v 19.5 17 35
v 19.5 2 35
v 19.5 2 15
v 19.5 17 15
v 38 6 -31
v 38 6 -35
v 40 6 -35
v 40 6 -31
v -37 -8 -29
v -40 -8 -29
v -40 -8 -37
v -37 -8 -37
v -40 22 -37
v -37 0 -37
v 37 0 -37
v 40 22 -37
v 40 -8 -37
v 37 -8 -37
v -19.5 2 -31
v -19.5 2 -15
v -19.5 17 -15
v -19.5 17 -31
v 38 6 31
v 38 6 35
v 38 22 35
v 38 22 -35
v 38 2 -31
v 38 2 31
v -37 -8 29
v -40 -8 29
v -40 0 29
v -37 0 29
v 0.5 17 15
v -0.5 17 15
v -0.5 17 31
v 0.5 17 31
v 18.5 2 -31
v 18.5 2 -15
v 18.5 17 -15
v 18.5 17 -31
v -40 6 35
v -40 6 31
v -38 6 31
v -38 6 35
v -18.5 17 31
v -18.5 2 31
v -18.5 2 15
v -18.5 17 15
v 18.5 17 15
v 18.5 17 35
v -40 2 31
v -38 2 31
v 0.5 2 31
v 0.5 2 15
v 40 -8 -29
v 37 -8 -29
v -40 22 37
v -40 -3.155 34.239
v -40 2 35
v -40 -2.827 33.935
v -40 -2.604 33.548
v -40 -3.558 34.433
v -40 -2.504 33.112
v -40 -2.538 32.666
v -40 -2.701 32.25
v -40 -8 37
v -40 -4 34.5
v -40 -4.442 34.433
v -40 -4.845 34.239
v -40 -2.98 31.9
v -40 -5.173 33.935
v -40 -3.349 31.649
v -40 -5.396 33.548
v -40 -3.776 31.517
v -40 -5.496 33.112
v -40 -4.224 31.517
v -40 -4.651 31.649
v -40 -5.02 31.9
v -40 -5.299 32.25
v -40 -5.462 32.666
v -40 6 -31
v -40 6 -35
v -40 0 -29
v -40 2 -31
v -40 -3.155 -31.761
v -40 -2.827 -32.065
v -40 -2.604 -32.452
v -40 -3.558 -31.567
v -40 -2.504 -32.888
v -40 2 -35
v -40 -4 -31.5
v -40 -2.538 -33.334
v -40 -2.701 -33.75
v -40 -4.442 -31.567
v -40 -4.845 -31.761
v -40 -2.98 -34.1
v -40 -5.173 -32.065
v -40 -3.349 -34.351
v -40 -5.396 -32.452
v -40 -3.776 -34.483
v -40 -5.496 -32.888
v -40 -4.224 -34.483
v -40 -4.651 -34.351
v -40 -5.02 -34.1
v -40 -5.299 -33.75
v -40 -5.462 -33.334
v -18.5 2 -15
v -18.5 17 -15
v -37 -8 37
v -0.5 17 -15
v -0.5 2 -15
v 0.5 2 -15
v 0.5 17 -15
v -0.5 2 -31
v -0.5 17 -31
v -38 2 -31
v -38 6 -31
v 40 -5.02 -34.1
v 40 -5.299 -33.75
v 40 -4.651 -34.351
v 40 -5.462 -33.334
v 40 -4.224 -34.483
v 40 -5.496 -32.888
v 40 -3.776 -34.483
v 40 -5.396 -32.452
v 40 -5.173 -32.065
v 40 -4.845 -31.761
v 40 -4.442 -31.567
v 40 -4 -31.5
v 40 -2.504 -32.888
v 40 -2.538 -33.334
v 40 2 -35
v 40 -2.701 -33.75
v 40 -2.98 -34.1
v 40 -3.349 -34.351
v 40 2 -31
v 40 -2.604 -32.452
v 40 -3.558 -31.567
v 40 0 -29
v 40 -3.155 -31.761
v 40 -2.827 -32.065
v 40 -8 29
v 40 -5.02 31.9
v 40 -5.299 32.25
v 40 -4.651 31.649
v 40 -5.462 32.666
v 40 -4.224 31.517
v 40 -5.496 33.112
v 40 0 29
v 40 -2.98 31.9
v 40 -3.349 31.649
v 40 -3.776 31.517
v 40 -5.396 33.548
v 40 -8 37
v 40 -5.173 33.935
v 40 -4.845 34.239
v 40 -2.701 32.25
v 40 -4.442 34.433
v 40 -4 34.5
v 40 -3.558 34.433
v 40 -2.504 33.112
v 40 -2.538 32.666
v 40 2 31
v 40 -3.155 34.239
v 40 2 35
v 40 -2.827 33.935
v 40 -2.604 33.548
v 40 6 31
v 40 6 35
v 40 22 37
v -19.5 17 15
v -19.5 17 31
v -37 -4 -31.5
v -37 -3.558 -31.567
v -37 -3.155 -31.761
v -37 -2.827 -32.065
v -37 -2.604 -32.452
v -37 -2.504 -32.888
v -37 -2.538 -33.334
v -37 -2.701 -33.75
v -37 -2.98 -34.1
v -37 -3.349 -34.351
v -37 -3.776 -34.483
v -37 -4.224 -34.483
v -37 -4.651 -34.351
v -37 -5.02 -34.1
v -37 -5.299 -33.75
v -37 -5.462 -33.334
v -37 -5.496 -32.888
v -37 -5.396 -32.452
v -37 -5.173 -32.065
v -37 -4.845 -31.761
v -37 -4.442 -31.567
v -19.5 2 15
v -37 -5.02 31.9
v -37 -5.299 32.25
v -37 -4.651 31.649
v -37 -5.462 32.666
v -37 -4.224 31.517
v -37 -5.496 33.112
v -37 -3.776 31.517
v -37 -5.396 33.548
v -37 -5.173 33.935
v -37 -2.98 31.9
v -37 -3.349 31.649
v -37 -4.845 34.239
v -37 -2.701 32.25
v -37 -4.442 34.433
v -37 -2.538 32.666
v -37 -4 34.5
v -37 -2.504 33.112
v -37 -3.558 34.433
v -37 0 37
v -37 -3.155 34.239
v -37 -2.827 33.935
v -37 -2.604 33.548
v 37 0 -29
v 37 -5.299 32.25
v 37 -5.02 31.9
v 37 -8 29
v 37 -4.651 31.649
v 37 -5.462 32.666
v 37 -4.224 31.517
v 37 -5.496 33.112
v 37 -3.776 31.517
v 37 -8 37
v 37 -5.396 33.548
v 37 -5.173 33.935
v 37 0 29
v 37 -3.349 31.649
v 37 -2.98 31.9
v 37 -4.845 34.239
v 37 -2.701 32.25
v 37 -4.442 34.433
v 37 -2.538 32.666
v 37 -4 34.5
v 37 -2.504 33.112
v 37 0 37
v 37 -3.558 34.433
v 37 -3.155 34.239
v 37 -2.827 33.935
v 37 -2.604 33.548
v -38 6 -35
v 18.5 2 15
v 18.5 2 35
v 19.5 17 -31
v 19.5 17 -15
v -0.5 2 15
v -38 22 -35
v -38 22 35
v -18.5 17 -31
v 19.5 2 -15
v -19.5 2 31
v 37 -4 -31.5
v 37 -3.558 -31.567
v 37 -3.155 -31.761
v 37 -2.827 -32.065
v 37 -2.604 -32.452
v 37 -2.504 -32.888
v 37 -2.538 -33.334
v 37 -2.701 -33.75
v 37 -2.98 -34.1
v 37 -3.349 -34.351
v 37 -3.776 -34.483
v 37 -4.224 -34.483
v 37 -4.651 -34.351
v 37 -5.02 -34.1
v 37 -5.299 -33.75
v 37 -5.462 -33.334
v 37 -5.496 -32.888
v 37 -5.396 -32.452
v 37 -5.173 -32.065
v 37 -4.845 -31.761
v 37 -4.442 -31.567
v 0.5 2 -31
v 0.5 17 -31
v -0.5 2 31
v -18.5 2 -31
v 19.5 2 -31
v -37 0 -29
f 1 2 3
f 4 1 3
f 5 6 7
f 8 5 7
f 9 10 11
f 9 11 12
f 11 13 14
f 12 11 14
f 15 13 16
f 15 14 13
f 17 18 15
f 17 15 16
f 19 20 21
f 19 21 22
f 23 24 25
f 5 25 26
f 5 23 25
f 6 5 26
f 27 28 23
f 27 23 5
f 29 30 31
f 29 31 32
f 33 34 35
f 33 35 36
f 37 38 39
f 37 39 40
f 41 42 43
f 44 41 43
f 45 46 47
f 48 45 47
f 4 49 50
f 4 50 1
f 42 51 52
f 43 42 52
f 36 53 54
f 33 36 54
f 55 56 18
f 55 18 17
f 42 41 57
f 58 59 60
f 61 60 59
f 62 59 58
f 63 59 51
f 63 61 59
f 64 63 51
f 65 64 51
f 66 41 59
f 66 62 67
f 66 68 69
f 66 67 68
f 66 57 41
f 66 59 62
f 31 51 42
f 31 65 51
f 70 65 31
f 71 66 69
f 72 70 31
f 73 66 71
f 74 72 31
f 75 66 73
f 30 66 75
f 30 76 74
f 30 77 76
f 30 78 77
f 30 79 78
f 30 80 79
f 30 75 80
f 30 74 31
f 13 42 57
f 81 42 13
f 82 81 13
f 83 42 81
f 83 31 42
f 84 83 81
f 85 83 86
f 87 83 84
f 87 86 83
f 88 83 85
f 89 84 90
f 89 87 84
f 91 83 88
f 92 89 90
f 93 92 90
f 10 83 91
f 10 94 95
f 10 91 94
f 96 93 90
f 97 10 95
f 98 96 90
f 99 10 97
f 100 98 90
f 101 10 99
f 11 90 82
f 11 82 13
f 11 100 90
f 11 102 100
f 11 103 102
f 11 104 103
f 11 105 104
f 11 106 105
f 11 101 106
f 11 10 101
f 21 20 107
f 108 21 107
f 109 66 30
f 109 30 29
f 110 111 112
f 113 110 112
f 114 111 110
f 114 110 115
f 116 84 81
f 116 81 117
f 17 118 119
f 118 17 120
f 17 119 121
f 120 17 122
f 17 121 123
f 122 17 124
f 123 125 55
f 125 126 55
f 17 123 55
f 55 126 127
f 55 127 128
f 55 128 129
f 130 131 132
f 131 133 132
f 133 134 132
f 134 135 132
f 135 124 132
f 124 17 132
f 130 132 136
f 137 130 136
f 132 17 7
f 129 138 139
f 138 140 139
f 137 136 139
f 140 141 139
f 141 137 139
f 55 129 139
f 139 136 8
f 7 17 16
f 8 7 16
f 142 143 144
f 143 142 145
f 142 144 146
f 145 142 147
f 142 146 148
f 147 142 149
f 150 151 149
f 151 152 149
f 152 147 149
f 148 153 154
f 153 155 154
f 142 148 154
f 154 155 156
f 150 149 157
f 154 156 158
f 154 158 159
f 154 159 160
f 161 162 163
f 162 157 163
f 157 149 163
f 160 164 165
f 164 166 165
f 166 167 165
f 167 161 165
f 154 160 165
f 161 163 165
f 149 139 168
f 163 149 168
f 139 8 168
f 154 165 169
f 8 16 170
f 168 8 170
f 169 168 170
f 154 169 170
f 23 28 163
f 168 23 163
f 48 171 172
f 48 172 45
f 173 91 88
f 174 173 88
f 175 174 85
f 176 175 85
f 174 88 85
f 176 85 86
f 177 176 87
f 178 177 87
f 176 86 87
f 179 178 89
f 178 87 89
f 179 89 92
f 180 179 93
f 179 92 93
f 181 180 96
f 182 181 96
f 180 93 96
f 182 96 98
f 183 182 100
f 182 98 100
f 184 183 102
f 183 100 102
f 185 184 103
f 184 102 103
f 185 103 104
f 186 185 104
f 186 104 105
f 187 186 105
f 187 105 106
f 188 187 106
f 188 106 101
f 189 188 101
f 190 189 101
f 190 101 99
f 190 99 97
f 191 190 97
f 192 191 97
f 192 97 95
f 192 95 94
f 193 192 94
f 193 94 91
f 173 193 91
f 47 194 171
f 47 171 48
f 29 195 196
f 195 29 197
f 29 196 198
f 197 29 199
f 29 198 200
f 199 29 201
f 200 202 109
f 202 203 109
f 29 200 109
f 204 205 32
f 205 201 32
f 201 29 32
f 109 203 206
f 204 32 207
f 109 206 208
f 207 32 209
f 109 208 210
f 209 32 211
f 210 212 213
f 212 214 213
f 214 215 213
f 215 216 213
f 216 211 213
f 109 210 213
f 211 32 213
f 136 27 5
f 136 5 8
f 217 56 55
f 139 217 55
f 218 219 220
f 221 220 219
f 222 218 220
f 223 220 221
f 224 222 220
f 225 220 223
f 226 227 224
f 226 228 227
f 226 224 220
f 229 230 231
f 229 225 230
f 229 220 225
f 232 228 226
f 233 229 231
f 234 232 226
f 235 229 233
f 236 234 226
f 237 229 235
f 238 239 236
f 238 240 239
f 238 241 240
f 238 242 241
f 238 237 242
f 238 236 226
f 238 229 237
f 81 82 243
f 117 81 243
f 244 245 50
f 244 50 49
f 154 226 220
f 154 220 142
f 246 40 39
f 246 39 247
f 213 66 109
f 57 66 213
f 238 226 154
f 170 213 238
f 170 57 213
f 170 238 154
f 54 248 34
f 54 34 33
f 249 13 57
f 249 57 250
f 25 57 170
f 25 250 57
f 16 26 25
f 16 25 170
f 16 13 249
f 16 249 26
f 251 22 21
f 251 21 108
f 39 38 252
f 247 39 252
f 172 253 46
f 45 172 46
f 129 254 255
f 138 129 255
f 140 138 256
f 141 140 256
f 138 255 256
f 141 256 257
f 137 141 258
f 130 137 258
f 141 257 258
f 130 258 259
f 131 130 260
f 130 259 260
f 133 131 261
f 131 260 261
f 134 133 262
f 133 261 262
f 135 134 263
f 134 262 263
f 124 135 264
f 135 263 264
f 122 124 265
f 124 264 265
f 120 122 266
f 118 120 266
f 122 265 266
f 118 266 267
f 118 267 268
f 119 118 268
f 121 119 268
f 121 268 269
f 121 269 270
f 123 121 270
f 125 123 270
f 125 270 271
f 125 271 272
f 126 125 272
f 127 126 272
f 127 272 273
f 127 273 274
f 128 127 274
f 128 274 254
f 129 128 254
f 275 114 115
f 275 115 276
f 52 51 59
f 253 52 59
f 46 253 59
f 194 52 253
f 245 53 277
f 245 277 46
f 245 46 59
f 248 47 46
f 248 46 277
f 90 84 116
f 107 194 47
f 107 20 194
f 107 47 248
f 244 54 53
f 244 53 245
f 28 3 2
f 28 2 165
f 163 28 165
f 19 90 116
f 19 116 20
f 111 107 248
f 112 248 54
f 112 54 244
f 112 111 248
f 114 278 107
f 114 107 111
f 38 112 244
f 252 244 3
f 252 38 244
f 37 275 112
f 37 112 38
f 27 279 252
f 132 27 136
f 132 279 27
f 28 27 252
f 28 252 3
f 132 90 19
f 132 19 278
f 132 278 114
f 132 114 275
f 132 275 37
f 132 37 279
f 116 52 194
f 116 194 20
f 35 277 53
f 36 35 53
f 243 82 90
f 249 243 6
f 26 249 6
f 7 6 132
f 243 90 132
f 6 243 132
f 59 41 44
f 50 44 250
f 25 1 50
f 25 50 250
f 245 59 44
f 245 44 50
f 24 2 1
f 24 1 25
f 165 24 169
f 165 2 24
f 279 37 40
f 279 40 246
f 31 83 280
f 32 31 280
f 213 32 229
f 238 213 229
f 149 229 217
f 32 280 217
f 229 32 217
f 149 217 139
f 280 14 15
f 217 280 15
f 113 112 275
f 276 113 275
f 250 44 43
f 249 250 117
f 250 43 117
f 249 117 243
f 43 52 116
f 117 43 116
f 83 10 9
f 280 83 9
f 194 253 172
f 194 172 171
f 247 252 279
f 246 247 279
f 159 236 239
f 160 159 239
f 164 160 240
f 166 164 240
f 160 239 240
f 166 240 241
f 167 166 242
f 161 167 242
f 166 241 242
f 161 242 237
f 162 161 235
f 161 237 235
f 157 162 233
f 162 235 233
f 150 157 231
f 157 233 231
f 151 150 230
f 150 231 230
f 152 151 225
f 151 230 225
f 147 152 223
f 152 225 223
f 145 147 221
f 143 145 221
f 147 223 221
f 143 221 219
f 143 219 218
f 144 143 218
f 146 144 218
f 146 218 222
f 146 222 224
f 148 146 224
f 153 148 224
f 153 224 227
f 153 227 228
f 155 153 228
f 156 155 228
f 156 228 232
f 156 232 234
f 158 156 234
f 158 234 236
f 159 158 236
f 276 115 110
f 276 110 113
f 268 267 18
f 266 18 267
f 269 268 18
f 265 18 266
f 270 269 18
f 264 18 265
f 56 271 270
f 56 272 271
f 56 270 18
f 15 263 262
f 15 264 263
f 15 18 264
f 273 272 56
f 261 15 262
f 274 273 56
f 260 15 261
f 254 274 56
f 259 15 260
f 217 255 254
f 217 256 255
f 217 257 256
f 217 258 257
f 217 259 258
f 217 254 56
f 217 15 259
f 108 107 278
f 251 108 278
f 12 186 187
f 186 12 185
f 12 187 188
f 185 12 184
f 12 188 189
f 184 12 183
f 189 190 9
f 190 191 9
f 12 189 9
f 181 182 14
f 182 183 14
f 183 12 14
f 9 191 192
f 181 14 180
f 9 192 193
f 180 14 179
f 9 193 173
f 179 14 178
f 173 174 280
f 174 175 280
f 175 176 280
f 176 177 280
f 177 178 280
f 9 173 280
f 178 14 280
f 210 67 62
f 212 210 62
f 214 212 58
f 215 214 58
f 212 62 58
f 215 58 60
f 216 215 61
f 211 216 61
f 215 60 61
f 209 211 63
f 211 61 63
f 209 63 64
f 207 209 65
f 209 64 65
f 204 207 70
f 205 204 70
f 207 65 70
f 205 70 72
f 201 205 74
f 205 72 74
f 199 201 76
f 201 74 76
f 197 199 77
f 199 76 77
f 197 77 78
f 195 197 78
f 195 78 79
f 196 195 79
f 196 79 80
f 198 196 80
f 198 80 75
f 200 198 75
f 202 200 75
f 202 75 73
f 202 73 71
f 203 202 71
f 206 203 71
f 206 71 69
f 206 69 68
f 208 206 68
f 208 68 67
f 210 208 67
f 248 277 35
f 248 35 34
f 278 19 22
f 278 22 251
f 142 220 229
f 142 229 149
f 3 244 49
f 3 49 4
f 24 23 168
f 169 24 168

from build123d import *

# Parameters (mm, degrees)
SKETCH_1_W          = 80
SKETCH_1_H          = 74
EXTRUDE_1_DEPTH     = 2
SKETCH_2_W          = 80
SKETCH_2_H          = 74
SKETCH_2_W_2        = 76
SKETCH_2_H_2        = 70
EXTRUDE_2_DEPTH     = 20
SKETCH_3_W          = 2
SKETCH_3_H          = 4
CUT_EXTRUDE_3_DEPTH = 4
SKETCH_4_W          = 1
SKETCH_4_H          = 16
SKETCH_4_H_2        = 20
EXTRUDE_3_DEPTH     = 15
SKETCH_6_W          = 3
SKETCH_6_H          = 8
EXTRUDE_4_DEPTH     = 8
SKETCH_7_R          = 1.5
CUT_EXTRUDE_5_DEPTH = 91.846023578


with BuildPart() as part:
    # Эскиз1 → Бобышка-Вытянуть1 (new body)
    with BuildSketch(Plane(origin=(0, 0, 0), x_dir=(1, 0, 0), z_dir=(0, 1, 0))):
        Rectangle(SKETCH_1_W, SKETCH_1_H)
    extrude(amount=EXTRUDE_1_DEPTH)

    # Эскиз2 → Бобышка-Вытянуть2 (add)
    with BuildSketch(Plane(origin=(0, 2, 0), x_dir=(1, 0, 0), z_dir=(0, 1, 0))):
        Rectangle(SKETCH_2_W, SKETCH_2_H)
        Rectangle(SKETCH_2_W_2, SKETCH_2_H_2, mode=Mode.SUBTRACT)
    extrude(amount=EXTRUDE_2_DEPTH)

    # Эскиз3 → Вырез-Вытянуть3 (cut)
    with BuildSketch(Plane(origin=(0, 2, 0), x_dir=(1, 0, 0), z_dir=(0, 1, 0))):
        with Locations((-39, 33)):
            Rectangle(SKETCH_3_W, SKETCH_3_H)
        with Locations((39, 33)):
            Rectangle(SKETCH_3_W, SKETCH_3_H)
        with Locations((39, -33)):
            Rectangle(SKETCH_3_W, SKETCH_3_H)
        with Locations((-39, -33)):
            Rectangle(SKETCH_3_W, SKETCH_3_H)
    extrude(amount=CUT_EXTRUDE_3_DEPTH, mode=Mode.SUBTRACT)

    # Эскиз4 → Бобышка-Вытянуть3 (add)
    with BuildSketch(Plane(origin=(0, 2, 0), x_dir=(1, 0, 0), z_dir=(0, 1, 0))):
        with Locations((-19, 23)):
            Rectangle(SKETCH_4_W, SKETCH_4_H)
        with Locations((0, 23)):
            Rectangle(SKETCH_4_W, SKETCH_4_H)
        with Locations((19, 23)):
            Rectangle(SKETCH_4_W, SKETCH_4_H)
        with Locations((-19, -23)):
            Rectangle(SKETCH_4_W, SKETCH_4_H)
        with Locations((0, -23)):
            Rectangle(SKETCH_4_W, SKETCH_4_H)
        with Locations((19, -25)):
            Rectangle(SKETCH_4_W, SKETCH_4_H_2)
    extrude(amount=EXTRUDE_3_DEPTH)

    # Эскиз6 → Бобышка-Вытянуть4 (add)
    with BuildSketch(Plane.XZ):
        with Locations((38.5, 33)):
            Rectangle(SKETCH_6_W, SKETCH_6_H)
        with Locations((38.5, -33)):
            Rectangle(SKETCH_6_W, SKETCH_6_H)
        with Locations((-38.5, -33)):
            Rectangle(SKETCH_6_W, SKETCH_6_H)
        with Locations((-38.5, 33)):
            Rectangle(SKETCH_6_W, SKETCH_6_H)
    extrude(amount=EXTRUDE_4_DEPTH)

    # Эскиз7 → Вырез-Вытянуть5 (cut, through all)
    with BuildSketch(Plane.ZY.offset(40)):
        with Locations((33, -4)):
            Circle(SKETCH_7_R)
        with Locations((-33, -4)):
            Circle(SKETCH_7_R)
    extrude(amount=-CUT_EXTRUDE_5_DEPTH, mode=Mode.SUBTRACT)


solid = part.part
